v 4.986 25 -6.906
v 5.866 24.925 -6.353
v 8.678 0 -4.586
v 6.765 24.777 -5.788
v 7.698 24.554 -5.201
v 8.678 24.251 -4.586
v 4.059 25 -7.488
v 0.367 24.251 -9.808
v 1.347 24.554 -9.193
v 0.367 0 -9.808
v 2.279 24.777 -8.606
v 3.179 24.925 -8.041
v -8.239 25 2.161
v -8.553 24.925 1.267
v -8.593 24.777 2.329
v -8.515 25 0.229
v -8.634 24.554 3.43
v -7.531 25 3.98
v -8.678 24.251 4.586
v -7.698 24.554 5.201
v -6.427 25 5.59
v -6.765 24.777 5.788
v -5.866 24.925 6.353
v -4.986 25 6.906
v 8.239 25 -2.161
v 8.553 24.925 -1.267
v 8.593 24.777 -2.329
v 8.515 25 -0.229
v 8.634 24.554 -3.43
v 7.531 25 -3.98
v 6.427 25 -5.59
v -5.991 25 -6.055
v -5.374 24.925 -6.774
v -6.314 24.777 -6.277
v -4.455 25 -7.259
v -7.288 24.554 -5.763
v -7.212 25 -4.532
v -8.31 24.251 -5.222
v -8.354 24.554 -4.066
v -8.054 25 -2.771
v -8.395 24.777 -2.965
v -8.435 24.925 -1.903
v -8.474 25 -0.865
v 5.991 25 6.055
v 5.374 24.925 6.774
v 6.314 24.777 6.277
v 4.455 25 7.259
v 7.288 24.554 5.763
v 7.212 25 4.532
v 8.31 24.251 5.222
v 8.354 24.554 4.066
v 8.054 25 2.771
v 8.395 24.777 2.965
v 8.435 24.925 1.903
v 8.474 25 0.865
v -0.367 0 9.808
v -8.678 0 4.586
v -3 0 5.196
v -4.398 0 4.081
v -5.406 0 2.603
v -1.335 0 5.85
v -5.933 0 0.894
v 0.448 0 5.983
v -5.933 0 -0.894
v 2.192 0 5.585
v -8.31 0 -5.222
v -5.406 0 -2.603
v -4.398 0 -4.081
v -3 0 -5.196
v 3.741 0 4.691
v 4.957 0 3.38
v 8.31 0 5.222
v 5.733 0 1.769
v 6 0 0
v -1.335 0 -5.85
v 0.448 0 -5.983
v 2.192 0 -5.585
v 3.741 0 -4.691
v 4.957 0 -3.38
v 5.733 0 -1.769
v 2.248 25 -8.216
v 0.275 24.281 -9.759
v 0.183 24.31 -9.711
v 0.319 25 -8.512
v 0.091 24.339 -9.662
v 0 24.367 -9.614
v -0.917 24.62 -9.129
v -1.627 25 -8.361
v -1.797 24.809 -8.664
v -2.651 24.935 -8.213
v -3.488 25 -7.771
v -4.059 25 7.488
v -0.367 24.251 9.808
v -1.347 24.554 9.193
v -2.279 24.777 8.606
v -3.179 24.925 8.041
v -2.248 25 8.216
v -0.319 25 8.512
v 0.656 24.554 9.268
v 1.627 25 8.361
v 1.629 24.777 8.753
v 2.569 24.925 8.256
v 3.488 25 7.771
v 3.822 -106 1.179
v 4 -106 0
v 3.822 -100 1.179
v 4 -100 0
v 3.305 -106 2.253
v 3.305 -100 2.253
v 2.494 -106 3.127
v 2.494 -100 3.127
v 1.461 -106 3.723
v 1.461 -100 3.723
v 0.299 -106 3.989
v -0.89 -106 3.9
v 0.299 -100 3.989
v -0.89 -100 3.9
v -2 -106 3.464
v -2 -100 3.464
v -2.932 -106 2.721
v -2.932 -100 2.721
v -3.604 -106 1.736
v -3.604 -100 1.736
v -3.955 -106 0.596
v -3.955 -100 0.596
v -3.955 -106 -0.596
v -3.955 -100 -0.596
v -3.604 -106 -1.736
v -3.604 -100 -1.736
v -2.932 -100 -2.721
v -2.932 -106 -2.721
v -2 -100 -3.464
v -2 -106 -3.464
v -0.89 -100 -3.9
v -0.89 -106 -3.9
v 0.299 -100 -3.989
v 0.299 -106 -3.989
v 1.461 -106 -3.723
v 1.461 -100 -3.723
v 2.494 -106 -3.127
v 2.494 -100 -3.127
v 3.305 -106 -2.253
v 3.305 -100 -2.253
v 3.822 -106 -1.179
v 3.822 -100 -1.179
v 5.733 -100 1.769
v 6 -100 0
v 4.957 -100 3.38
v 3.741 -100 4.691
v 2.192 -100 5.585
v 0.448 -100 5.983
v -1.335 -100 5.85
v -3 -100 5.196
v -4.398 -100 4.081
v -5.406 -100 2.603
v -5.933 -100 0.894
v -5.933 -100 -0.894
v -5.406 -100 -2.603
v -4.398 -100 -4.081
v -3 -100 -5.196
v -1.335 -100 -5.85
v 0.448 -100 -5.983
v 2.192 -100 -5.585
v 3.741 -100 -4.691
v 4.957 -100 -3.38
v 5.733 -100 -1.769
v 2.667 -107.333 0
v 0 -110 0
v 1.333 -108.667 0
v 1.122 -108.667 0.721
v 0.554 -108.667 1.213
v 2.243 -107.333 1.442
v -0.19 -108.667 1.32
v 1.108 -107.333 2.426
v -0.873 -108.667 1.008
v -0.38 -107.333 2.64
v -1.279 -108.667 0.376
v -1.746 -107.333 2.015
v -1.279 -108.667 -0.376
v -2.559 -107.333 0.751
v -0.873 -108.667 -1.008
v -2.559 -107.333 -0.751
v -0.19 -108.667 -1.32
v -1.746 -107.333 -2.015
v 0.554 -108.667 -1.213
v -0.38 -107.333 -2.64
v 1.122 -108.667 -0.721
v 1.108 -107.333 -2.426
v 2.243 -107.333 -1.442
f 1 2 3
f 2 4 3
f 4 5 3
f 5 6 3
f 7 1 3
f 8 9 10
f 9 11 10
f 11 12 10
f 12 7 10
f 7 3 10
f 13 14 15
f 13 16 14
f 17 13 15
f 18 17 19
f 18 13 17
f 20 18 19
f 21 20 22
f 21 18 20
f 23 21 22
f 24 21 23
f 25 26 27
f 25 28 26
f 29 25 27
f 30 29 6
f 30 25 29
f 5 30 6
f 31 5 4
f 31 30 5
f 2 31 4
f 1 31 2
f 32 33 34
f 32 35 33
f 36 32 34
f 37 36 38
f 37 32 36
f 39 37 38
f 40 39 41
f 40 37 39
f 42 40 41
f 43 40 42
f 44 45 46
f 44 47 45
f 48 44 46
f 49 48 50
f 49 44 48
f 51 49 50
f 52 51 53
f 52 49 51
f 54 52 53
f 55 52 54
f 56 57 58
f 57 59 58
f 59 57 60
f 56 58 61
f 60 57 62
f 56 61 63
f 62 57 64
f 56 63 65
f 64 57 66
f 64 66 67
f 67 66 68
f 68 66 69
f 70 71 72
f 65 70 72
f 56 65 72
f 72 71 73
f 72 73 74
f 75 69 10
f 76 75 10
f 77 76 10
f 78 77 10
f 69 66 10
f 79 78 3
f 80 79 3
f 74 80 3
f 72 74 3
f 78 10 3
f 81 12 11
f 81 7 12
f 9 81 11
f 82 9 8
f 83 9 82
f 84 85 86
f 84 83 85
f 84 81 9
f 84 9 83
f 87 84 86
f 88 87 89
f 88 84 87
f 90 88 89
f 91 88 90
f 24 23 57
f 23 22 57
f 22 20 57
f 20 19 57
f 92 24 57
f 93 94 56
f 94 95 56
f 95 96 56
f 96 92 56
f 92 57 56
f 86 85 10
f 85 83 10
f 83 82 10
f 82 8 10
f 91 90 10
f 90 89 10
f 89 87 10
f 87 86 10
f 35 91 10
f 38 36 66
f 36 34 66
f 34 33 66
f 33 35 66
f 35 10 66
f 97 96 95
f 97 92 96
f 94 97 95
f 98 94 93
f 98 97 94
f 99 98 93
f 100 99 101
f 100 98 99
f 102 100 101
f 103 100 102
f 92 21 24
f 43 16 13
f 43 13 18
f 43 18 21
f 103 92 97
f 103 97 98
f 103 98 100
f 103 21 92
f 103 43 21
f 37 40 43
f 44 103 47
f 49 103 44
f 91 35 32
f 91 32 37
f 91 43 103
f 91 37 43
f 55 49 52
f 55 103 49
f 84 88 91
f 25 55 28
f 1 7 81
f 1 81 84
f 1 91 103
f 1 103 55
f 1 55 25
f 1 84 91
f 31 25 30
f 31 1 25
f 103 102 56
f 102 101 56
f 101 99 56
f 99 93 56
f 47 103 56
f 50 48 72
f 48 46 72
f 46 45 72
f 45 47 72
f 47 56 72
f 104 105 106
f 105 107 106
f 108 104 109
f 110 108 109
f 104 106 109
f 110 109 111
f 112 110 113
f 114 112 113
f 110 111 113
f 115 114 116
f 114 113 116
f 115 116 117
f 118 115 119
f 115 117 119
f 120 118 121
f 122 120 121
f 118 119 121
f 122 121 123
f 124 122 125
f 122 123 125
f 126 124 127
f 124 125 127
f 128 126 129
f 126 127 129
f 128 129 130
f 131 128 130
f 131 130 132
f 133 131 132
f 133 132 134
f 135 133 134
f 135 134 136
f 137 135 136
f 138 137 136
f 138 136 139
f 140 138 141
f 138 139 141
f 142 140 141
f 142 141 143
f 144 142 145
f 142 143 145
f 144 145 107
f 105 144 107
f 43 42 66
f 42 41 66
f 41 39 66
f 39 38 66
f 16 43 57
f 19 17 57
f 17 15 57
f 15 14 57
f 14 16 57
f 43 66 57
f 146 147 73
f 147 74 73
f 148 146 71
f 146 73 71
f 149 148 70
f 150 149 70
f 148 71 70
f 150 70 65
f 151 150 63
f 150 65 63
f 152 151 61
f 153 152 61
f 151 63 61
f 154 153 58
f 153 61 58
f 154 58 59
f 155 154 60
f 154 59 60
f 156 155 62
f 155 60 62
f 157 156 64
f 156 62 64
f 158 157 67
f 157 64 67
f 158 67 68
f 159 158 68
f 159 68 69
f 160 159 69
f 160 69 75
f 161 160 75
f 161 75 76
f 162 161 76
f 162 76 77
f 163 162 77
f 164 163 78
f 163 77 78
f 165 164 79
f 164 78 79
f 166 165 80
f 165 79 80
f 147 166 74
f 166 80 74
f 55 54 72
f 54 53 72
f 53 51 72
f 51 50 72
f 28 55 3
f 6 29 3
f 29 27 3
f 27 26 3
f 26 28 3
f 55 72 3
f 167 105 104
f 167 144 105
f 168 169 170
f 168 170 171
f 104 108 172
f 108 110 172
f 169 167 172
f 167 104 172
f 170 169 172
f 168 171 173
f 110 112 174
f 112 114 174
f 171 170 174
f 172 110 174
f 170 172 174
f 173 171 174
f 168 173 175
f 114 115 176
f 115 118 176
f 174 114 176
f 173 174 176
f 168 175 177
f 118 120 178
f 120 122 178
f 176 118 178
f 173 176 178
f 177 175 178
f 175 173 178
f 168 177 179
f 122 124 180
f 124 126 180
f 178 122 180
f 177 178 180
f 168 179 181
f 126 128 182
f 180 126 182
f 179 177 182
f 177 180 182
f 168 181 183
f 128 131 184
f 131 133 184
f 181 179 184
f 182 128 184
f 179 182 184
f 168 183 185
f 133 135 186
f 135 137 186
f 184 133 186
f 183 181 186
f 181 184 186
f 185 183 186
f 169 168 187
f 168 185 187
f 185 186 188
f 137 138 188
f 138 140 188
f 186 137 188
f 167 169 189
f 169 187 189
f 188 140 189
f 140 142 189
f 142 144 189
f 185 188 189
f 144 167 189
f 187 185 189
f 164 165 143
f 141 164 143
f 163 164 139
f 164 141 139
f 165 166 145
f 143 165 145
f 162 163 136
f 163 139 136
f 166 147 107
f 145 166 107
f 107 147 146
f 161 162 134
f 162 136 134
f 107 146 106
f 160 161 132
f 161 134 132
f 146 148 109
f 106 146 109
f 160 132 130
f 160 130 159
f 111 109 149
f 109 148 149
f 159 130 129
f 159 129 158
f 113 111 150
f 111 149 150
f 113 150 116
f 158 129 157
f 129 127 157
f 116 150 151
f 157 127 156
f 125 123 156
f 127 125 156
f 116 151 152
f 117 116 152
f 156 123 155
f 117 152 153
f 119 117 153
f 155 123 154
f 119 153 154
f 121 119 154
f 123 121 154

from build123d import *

# Parameters (mm, degrees)
SALIENTE_EXTRUIR1_DEPTH = 25


with BuildPart() as part:
    # Croquis1 → Revolución3 (revolve)
    with BuildSketch(Plane.XY):
        Polygon((0, 0), (0, -110), (4, -106), (4, -100), (6, -100), (6, 0), align=None)
    revolve(axis=Axis((0, 0, 0), (0, -1, 0)))

    # Croquis2 → Saliente-Extruir1 (add)
    with BuildSketch(Plane(origin=(0, 0, 0), x_dir=(1, 0, 0), z_dir=(0, 1, 0))):
        Polygon((8.310422033, -5.222089521), (8.677673202, 4.585991836), (0.367251169, 9.808081357), (-8.310422033, 5.222089521), (-8.677673202, -4.585991836), (-0.367251169, -9.808081357), align=None)
    extrude(amount=SALIENTE_EXTRUIR1_DEPTH)

    # Croquis3 → Cortar-Revolución1 (revolve, cut)
    with BuildSketch(Plane(origin=(0, 0, 0), x_dir=(0, 0, -1), z_dir=(1, 0, 0))):
        Polygon((5.04976064, 27.002153948), (10.24964381, 27.002153948), (10.24964381, 24), align=None)
    revolve(axis=Axis((0, 0, 0), (0, 1, 0)), mode=Mode.SUBTRACT)


solid = part.part
